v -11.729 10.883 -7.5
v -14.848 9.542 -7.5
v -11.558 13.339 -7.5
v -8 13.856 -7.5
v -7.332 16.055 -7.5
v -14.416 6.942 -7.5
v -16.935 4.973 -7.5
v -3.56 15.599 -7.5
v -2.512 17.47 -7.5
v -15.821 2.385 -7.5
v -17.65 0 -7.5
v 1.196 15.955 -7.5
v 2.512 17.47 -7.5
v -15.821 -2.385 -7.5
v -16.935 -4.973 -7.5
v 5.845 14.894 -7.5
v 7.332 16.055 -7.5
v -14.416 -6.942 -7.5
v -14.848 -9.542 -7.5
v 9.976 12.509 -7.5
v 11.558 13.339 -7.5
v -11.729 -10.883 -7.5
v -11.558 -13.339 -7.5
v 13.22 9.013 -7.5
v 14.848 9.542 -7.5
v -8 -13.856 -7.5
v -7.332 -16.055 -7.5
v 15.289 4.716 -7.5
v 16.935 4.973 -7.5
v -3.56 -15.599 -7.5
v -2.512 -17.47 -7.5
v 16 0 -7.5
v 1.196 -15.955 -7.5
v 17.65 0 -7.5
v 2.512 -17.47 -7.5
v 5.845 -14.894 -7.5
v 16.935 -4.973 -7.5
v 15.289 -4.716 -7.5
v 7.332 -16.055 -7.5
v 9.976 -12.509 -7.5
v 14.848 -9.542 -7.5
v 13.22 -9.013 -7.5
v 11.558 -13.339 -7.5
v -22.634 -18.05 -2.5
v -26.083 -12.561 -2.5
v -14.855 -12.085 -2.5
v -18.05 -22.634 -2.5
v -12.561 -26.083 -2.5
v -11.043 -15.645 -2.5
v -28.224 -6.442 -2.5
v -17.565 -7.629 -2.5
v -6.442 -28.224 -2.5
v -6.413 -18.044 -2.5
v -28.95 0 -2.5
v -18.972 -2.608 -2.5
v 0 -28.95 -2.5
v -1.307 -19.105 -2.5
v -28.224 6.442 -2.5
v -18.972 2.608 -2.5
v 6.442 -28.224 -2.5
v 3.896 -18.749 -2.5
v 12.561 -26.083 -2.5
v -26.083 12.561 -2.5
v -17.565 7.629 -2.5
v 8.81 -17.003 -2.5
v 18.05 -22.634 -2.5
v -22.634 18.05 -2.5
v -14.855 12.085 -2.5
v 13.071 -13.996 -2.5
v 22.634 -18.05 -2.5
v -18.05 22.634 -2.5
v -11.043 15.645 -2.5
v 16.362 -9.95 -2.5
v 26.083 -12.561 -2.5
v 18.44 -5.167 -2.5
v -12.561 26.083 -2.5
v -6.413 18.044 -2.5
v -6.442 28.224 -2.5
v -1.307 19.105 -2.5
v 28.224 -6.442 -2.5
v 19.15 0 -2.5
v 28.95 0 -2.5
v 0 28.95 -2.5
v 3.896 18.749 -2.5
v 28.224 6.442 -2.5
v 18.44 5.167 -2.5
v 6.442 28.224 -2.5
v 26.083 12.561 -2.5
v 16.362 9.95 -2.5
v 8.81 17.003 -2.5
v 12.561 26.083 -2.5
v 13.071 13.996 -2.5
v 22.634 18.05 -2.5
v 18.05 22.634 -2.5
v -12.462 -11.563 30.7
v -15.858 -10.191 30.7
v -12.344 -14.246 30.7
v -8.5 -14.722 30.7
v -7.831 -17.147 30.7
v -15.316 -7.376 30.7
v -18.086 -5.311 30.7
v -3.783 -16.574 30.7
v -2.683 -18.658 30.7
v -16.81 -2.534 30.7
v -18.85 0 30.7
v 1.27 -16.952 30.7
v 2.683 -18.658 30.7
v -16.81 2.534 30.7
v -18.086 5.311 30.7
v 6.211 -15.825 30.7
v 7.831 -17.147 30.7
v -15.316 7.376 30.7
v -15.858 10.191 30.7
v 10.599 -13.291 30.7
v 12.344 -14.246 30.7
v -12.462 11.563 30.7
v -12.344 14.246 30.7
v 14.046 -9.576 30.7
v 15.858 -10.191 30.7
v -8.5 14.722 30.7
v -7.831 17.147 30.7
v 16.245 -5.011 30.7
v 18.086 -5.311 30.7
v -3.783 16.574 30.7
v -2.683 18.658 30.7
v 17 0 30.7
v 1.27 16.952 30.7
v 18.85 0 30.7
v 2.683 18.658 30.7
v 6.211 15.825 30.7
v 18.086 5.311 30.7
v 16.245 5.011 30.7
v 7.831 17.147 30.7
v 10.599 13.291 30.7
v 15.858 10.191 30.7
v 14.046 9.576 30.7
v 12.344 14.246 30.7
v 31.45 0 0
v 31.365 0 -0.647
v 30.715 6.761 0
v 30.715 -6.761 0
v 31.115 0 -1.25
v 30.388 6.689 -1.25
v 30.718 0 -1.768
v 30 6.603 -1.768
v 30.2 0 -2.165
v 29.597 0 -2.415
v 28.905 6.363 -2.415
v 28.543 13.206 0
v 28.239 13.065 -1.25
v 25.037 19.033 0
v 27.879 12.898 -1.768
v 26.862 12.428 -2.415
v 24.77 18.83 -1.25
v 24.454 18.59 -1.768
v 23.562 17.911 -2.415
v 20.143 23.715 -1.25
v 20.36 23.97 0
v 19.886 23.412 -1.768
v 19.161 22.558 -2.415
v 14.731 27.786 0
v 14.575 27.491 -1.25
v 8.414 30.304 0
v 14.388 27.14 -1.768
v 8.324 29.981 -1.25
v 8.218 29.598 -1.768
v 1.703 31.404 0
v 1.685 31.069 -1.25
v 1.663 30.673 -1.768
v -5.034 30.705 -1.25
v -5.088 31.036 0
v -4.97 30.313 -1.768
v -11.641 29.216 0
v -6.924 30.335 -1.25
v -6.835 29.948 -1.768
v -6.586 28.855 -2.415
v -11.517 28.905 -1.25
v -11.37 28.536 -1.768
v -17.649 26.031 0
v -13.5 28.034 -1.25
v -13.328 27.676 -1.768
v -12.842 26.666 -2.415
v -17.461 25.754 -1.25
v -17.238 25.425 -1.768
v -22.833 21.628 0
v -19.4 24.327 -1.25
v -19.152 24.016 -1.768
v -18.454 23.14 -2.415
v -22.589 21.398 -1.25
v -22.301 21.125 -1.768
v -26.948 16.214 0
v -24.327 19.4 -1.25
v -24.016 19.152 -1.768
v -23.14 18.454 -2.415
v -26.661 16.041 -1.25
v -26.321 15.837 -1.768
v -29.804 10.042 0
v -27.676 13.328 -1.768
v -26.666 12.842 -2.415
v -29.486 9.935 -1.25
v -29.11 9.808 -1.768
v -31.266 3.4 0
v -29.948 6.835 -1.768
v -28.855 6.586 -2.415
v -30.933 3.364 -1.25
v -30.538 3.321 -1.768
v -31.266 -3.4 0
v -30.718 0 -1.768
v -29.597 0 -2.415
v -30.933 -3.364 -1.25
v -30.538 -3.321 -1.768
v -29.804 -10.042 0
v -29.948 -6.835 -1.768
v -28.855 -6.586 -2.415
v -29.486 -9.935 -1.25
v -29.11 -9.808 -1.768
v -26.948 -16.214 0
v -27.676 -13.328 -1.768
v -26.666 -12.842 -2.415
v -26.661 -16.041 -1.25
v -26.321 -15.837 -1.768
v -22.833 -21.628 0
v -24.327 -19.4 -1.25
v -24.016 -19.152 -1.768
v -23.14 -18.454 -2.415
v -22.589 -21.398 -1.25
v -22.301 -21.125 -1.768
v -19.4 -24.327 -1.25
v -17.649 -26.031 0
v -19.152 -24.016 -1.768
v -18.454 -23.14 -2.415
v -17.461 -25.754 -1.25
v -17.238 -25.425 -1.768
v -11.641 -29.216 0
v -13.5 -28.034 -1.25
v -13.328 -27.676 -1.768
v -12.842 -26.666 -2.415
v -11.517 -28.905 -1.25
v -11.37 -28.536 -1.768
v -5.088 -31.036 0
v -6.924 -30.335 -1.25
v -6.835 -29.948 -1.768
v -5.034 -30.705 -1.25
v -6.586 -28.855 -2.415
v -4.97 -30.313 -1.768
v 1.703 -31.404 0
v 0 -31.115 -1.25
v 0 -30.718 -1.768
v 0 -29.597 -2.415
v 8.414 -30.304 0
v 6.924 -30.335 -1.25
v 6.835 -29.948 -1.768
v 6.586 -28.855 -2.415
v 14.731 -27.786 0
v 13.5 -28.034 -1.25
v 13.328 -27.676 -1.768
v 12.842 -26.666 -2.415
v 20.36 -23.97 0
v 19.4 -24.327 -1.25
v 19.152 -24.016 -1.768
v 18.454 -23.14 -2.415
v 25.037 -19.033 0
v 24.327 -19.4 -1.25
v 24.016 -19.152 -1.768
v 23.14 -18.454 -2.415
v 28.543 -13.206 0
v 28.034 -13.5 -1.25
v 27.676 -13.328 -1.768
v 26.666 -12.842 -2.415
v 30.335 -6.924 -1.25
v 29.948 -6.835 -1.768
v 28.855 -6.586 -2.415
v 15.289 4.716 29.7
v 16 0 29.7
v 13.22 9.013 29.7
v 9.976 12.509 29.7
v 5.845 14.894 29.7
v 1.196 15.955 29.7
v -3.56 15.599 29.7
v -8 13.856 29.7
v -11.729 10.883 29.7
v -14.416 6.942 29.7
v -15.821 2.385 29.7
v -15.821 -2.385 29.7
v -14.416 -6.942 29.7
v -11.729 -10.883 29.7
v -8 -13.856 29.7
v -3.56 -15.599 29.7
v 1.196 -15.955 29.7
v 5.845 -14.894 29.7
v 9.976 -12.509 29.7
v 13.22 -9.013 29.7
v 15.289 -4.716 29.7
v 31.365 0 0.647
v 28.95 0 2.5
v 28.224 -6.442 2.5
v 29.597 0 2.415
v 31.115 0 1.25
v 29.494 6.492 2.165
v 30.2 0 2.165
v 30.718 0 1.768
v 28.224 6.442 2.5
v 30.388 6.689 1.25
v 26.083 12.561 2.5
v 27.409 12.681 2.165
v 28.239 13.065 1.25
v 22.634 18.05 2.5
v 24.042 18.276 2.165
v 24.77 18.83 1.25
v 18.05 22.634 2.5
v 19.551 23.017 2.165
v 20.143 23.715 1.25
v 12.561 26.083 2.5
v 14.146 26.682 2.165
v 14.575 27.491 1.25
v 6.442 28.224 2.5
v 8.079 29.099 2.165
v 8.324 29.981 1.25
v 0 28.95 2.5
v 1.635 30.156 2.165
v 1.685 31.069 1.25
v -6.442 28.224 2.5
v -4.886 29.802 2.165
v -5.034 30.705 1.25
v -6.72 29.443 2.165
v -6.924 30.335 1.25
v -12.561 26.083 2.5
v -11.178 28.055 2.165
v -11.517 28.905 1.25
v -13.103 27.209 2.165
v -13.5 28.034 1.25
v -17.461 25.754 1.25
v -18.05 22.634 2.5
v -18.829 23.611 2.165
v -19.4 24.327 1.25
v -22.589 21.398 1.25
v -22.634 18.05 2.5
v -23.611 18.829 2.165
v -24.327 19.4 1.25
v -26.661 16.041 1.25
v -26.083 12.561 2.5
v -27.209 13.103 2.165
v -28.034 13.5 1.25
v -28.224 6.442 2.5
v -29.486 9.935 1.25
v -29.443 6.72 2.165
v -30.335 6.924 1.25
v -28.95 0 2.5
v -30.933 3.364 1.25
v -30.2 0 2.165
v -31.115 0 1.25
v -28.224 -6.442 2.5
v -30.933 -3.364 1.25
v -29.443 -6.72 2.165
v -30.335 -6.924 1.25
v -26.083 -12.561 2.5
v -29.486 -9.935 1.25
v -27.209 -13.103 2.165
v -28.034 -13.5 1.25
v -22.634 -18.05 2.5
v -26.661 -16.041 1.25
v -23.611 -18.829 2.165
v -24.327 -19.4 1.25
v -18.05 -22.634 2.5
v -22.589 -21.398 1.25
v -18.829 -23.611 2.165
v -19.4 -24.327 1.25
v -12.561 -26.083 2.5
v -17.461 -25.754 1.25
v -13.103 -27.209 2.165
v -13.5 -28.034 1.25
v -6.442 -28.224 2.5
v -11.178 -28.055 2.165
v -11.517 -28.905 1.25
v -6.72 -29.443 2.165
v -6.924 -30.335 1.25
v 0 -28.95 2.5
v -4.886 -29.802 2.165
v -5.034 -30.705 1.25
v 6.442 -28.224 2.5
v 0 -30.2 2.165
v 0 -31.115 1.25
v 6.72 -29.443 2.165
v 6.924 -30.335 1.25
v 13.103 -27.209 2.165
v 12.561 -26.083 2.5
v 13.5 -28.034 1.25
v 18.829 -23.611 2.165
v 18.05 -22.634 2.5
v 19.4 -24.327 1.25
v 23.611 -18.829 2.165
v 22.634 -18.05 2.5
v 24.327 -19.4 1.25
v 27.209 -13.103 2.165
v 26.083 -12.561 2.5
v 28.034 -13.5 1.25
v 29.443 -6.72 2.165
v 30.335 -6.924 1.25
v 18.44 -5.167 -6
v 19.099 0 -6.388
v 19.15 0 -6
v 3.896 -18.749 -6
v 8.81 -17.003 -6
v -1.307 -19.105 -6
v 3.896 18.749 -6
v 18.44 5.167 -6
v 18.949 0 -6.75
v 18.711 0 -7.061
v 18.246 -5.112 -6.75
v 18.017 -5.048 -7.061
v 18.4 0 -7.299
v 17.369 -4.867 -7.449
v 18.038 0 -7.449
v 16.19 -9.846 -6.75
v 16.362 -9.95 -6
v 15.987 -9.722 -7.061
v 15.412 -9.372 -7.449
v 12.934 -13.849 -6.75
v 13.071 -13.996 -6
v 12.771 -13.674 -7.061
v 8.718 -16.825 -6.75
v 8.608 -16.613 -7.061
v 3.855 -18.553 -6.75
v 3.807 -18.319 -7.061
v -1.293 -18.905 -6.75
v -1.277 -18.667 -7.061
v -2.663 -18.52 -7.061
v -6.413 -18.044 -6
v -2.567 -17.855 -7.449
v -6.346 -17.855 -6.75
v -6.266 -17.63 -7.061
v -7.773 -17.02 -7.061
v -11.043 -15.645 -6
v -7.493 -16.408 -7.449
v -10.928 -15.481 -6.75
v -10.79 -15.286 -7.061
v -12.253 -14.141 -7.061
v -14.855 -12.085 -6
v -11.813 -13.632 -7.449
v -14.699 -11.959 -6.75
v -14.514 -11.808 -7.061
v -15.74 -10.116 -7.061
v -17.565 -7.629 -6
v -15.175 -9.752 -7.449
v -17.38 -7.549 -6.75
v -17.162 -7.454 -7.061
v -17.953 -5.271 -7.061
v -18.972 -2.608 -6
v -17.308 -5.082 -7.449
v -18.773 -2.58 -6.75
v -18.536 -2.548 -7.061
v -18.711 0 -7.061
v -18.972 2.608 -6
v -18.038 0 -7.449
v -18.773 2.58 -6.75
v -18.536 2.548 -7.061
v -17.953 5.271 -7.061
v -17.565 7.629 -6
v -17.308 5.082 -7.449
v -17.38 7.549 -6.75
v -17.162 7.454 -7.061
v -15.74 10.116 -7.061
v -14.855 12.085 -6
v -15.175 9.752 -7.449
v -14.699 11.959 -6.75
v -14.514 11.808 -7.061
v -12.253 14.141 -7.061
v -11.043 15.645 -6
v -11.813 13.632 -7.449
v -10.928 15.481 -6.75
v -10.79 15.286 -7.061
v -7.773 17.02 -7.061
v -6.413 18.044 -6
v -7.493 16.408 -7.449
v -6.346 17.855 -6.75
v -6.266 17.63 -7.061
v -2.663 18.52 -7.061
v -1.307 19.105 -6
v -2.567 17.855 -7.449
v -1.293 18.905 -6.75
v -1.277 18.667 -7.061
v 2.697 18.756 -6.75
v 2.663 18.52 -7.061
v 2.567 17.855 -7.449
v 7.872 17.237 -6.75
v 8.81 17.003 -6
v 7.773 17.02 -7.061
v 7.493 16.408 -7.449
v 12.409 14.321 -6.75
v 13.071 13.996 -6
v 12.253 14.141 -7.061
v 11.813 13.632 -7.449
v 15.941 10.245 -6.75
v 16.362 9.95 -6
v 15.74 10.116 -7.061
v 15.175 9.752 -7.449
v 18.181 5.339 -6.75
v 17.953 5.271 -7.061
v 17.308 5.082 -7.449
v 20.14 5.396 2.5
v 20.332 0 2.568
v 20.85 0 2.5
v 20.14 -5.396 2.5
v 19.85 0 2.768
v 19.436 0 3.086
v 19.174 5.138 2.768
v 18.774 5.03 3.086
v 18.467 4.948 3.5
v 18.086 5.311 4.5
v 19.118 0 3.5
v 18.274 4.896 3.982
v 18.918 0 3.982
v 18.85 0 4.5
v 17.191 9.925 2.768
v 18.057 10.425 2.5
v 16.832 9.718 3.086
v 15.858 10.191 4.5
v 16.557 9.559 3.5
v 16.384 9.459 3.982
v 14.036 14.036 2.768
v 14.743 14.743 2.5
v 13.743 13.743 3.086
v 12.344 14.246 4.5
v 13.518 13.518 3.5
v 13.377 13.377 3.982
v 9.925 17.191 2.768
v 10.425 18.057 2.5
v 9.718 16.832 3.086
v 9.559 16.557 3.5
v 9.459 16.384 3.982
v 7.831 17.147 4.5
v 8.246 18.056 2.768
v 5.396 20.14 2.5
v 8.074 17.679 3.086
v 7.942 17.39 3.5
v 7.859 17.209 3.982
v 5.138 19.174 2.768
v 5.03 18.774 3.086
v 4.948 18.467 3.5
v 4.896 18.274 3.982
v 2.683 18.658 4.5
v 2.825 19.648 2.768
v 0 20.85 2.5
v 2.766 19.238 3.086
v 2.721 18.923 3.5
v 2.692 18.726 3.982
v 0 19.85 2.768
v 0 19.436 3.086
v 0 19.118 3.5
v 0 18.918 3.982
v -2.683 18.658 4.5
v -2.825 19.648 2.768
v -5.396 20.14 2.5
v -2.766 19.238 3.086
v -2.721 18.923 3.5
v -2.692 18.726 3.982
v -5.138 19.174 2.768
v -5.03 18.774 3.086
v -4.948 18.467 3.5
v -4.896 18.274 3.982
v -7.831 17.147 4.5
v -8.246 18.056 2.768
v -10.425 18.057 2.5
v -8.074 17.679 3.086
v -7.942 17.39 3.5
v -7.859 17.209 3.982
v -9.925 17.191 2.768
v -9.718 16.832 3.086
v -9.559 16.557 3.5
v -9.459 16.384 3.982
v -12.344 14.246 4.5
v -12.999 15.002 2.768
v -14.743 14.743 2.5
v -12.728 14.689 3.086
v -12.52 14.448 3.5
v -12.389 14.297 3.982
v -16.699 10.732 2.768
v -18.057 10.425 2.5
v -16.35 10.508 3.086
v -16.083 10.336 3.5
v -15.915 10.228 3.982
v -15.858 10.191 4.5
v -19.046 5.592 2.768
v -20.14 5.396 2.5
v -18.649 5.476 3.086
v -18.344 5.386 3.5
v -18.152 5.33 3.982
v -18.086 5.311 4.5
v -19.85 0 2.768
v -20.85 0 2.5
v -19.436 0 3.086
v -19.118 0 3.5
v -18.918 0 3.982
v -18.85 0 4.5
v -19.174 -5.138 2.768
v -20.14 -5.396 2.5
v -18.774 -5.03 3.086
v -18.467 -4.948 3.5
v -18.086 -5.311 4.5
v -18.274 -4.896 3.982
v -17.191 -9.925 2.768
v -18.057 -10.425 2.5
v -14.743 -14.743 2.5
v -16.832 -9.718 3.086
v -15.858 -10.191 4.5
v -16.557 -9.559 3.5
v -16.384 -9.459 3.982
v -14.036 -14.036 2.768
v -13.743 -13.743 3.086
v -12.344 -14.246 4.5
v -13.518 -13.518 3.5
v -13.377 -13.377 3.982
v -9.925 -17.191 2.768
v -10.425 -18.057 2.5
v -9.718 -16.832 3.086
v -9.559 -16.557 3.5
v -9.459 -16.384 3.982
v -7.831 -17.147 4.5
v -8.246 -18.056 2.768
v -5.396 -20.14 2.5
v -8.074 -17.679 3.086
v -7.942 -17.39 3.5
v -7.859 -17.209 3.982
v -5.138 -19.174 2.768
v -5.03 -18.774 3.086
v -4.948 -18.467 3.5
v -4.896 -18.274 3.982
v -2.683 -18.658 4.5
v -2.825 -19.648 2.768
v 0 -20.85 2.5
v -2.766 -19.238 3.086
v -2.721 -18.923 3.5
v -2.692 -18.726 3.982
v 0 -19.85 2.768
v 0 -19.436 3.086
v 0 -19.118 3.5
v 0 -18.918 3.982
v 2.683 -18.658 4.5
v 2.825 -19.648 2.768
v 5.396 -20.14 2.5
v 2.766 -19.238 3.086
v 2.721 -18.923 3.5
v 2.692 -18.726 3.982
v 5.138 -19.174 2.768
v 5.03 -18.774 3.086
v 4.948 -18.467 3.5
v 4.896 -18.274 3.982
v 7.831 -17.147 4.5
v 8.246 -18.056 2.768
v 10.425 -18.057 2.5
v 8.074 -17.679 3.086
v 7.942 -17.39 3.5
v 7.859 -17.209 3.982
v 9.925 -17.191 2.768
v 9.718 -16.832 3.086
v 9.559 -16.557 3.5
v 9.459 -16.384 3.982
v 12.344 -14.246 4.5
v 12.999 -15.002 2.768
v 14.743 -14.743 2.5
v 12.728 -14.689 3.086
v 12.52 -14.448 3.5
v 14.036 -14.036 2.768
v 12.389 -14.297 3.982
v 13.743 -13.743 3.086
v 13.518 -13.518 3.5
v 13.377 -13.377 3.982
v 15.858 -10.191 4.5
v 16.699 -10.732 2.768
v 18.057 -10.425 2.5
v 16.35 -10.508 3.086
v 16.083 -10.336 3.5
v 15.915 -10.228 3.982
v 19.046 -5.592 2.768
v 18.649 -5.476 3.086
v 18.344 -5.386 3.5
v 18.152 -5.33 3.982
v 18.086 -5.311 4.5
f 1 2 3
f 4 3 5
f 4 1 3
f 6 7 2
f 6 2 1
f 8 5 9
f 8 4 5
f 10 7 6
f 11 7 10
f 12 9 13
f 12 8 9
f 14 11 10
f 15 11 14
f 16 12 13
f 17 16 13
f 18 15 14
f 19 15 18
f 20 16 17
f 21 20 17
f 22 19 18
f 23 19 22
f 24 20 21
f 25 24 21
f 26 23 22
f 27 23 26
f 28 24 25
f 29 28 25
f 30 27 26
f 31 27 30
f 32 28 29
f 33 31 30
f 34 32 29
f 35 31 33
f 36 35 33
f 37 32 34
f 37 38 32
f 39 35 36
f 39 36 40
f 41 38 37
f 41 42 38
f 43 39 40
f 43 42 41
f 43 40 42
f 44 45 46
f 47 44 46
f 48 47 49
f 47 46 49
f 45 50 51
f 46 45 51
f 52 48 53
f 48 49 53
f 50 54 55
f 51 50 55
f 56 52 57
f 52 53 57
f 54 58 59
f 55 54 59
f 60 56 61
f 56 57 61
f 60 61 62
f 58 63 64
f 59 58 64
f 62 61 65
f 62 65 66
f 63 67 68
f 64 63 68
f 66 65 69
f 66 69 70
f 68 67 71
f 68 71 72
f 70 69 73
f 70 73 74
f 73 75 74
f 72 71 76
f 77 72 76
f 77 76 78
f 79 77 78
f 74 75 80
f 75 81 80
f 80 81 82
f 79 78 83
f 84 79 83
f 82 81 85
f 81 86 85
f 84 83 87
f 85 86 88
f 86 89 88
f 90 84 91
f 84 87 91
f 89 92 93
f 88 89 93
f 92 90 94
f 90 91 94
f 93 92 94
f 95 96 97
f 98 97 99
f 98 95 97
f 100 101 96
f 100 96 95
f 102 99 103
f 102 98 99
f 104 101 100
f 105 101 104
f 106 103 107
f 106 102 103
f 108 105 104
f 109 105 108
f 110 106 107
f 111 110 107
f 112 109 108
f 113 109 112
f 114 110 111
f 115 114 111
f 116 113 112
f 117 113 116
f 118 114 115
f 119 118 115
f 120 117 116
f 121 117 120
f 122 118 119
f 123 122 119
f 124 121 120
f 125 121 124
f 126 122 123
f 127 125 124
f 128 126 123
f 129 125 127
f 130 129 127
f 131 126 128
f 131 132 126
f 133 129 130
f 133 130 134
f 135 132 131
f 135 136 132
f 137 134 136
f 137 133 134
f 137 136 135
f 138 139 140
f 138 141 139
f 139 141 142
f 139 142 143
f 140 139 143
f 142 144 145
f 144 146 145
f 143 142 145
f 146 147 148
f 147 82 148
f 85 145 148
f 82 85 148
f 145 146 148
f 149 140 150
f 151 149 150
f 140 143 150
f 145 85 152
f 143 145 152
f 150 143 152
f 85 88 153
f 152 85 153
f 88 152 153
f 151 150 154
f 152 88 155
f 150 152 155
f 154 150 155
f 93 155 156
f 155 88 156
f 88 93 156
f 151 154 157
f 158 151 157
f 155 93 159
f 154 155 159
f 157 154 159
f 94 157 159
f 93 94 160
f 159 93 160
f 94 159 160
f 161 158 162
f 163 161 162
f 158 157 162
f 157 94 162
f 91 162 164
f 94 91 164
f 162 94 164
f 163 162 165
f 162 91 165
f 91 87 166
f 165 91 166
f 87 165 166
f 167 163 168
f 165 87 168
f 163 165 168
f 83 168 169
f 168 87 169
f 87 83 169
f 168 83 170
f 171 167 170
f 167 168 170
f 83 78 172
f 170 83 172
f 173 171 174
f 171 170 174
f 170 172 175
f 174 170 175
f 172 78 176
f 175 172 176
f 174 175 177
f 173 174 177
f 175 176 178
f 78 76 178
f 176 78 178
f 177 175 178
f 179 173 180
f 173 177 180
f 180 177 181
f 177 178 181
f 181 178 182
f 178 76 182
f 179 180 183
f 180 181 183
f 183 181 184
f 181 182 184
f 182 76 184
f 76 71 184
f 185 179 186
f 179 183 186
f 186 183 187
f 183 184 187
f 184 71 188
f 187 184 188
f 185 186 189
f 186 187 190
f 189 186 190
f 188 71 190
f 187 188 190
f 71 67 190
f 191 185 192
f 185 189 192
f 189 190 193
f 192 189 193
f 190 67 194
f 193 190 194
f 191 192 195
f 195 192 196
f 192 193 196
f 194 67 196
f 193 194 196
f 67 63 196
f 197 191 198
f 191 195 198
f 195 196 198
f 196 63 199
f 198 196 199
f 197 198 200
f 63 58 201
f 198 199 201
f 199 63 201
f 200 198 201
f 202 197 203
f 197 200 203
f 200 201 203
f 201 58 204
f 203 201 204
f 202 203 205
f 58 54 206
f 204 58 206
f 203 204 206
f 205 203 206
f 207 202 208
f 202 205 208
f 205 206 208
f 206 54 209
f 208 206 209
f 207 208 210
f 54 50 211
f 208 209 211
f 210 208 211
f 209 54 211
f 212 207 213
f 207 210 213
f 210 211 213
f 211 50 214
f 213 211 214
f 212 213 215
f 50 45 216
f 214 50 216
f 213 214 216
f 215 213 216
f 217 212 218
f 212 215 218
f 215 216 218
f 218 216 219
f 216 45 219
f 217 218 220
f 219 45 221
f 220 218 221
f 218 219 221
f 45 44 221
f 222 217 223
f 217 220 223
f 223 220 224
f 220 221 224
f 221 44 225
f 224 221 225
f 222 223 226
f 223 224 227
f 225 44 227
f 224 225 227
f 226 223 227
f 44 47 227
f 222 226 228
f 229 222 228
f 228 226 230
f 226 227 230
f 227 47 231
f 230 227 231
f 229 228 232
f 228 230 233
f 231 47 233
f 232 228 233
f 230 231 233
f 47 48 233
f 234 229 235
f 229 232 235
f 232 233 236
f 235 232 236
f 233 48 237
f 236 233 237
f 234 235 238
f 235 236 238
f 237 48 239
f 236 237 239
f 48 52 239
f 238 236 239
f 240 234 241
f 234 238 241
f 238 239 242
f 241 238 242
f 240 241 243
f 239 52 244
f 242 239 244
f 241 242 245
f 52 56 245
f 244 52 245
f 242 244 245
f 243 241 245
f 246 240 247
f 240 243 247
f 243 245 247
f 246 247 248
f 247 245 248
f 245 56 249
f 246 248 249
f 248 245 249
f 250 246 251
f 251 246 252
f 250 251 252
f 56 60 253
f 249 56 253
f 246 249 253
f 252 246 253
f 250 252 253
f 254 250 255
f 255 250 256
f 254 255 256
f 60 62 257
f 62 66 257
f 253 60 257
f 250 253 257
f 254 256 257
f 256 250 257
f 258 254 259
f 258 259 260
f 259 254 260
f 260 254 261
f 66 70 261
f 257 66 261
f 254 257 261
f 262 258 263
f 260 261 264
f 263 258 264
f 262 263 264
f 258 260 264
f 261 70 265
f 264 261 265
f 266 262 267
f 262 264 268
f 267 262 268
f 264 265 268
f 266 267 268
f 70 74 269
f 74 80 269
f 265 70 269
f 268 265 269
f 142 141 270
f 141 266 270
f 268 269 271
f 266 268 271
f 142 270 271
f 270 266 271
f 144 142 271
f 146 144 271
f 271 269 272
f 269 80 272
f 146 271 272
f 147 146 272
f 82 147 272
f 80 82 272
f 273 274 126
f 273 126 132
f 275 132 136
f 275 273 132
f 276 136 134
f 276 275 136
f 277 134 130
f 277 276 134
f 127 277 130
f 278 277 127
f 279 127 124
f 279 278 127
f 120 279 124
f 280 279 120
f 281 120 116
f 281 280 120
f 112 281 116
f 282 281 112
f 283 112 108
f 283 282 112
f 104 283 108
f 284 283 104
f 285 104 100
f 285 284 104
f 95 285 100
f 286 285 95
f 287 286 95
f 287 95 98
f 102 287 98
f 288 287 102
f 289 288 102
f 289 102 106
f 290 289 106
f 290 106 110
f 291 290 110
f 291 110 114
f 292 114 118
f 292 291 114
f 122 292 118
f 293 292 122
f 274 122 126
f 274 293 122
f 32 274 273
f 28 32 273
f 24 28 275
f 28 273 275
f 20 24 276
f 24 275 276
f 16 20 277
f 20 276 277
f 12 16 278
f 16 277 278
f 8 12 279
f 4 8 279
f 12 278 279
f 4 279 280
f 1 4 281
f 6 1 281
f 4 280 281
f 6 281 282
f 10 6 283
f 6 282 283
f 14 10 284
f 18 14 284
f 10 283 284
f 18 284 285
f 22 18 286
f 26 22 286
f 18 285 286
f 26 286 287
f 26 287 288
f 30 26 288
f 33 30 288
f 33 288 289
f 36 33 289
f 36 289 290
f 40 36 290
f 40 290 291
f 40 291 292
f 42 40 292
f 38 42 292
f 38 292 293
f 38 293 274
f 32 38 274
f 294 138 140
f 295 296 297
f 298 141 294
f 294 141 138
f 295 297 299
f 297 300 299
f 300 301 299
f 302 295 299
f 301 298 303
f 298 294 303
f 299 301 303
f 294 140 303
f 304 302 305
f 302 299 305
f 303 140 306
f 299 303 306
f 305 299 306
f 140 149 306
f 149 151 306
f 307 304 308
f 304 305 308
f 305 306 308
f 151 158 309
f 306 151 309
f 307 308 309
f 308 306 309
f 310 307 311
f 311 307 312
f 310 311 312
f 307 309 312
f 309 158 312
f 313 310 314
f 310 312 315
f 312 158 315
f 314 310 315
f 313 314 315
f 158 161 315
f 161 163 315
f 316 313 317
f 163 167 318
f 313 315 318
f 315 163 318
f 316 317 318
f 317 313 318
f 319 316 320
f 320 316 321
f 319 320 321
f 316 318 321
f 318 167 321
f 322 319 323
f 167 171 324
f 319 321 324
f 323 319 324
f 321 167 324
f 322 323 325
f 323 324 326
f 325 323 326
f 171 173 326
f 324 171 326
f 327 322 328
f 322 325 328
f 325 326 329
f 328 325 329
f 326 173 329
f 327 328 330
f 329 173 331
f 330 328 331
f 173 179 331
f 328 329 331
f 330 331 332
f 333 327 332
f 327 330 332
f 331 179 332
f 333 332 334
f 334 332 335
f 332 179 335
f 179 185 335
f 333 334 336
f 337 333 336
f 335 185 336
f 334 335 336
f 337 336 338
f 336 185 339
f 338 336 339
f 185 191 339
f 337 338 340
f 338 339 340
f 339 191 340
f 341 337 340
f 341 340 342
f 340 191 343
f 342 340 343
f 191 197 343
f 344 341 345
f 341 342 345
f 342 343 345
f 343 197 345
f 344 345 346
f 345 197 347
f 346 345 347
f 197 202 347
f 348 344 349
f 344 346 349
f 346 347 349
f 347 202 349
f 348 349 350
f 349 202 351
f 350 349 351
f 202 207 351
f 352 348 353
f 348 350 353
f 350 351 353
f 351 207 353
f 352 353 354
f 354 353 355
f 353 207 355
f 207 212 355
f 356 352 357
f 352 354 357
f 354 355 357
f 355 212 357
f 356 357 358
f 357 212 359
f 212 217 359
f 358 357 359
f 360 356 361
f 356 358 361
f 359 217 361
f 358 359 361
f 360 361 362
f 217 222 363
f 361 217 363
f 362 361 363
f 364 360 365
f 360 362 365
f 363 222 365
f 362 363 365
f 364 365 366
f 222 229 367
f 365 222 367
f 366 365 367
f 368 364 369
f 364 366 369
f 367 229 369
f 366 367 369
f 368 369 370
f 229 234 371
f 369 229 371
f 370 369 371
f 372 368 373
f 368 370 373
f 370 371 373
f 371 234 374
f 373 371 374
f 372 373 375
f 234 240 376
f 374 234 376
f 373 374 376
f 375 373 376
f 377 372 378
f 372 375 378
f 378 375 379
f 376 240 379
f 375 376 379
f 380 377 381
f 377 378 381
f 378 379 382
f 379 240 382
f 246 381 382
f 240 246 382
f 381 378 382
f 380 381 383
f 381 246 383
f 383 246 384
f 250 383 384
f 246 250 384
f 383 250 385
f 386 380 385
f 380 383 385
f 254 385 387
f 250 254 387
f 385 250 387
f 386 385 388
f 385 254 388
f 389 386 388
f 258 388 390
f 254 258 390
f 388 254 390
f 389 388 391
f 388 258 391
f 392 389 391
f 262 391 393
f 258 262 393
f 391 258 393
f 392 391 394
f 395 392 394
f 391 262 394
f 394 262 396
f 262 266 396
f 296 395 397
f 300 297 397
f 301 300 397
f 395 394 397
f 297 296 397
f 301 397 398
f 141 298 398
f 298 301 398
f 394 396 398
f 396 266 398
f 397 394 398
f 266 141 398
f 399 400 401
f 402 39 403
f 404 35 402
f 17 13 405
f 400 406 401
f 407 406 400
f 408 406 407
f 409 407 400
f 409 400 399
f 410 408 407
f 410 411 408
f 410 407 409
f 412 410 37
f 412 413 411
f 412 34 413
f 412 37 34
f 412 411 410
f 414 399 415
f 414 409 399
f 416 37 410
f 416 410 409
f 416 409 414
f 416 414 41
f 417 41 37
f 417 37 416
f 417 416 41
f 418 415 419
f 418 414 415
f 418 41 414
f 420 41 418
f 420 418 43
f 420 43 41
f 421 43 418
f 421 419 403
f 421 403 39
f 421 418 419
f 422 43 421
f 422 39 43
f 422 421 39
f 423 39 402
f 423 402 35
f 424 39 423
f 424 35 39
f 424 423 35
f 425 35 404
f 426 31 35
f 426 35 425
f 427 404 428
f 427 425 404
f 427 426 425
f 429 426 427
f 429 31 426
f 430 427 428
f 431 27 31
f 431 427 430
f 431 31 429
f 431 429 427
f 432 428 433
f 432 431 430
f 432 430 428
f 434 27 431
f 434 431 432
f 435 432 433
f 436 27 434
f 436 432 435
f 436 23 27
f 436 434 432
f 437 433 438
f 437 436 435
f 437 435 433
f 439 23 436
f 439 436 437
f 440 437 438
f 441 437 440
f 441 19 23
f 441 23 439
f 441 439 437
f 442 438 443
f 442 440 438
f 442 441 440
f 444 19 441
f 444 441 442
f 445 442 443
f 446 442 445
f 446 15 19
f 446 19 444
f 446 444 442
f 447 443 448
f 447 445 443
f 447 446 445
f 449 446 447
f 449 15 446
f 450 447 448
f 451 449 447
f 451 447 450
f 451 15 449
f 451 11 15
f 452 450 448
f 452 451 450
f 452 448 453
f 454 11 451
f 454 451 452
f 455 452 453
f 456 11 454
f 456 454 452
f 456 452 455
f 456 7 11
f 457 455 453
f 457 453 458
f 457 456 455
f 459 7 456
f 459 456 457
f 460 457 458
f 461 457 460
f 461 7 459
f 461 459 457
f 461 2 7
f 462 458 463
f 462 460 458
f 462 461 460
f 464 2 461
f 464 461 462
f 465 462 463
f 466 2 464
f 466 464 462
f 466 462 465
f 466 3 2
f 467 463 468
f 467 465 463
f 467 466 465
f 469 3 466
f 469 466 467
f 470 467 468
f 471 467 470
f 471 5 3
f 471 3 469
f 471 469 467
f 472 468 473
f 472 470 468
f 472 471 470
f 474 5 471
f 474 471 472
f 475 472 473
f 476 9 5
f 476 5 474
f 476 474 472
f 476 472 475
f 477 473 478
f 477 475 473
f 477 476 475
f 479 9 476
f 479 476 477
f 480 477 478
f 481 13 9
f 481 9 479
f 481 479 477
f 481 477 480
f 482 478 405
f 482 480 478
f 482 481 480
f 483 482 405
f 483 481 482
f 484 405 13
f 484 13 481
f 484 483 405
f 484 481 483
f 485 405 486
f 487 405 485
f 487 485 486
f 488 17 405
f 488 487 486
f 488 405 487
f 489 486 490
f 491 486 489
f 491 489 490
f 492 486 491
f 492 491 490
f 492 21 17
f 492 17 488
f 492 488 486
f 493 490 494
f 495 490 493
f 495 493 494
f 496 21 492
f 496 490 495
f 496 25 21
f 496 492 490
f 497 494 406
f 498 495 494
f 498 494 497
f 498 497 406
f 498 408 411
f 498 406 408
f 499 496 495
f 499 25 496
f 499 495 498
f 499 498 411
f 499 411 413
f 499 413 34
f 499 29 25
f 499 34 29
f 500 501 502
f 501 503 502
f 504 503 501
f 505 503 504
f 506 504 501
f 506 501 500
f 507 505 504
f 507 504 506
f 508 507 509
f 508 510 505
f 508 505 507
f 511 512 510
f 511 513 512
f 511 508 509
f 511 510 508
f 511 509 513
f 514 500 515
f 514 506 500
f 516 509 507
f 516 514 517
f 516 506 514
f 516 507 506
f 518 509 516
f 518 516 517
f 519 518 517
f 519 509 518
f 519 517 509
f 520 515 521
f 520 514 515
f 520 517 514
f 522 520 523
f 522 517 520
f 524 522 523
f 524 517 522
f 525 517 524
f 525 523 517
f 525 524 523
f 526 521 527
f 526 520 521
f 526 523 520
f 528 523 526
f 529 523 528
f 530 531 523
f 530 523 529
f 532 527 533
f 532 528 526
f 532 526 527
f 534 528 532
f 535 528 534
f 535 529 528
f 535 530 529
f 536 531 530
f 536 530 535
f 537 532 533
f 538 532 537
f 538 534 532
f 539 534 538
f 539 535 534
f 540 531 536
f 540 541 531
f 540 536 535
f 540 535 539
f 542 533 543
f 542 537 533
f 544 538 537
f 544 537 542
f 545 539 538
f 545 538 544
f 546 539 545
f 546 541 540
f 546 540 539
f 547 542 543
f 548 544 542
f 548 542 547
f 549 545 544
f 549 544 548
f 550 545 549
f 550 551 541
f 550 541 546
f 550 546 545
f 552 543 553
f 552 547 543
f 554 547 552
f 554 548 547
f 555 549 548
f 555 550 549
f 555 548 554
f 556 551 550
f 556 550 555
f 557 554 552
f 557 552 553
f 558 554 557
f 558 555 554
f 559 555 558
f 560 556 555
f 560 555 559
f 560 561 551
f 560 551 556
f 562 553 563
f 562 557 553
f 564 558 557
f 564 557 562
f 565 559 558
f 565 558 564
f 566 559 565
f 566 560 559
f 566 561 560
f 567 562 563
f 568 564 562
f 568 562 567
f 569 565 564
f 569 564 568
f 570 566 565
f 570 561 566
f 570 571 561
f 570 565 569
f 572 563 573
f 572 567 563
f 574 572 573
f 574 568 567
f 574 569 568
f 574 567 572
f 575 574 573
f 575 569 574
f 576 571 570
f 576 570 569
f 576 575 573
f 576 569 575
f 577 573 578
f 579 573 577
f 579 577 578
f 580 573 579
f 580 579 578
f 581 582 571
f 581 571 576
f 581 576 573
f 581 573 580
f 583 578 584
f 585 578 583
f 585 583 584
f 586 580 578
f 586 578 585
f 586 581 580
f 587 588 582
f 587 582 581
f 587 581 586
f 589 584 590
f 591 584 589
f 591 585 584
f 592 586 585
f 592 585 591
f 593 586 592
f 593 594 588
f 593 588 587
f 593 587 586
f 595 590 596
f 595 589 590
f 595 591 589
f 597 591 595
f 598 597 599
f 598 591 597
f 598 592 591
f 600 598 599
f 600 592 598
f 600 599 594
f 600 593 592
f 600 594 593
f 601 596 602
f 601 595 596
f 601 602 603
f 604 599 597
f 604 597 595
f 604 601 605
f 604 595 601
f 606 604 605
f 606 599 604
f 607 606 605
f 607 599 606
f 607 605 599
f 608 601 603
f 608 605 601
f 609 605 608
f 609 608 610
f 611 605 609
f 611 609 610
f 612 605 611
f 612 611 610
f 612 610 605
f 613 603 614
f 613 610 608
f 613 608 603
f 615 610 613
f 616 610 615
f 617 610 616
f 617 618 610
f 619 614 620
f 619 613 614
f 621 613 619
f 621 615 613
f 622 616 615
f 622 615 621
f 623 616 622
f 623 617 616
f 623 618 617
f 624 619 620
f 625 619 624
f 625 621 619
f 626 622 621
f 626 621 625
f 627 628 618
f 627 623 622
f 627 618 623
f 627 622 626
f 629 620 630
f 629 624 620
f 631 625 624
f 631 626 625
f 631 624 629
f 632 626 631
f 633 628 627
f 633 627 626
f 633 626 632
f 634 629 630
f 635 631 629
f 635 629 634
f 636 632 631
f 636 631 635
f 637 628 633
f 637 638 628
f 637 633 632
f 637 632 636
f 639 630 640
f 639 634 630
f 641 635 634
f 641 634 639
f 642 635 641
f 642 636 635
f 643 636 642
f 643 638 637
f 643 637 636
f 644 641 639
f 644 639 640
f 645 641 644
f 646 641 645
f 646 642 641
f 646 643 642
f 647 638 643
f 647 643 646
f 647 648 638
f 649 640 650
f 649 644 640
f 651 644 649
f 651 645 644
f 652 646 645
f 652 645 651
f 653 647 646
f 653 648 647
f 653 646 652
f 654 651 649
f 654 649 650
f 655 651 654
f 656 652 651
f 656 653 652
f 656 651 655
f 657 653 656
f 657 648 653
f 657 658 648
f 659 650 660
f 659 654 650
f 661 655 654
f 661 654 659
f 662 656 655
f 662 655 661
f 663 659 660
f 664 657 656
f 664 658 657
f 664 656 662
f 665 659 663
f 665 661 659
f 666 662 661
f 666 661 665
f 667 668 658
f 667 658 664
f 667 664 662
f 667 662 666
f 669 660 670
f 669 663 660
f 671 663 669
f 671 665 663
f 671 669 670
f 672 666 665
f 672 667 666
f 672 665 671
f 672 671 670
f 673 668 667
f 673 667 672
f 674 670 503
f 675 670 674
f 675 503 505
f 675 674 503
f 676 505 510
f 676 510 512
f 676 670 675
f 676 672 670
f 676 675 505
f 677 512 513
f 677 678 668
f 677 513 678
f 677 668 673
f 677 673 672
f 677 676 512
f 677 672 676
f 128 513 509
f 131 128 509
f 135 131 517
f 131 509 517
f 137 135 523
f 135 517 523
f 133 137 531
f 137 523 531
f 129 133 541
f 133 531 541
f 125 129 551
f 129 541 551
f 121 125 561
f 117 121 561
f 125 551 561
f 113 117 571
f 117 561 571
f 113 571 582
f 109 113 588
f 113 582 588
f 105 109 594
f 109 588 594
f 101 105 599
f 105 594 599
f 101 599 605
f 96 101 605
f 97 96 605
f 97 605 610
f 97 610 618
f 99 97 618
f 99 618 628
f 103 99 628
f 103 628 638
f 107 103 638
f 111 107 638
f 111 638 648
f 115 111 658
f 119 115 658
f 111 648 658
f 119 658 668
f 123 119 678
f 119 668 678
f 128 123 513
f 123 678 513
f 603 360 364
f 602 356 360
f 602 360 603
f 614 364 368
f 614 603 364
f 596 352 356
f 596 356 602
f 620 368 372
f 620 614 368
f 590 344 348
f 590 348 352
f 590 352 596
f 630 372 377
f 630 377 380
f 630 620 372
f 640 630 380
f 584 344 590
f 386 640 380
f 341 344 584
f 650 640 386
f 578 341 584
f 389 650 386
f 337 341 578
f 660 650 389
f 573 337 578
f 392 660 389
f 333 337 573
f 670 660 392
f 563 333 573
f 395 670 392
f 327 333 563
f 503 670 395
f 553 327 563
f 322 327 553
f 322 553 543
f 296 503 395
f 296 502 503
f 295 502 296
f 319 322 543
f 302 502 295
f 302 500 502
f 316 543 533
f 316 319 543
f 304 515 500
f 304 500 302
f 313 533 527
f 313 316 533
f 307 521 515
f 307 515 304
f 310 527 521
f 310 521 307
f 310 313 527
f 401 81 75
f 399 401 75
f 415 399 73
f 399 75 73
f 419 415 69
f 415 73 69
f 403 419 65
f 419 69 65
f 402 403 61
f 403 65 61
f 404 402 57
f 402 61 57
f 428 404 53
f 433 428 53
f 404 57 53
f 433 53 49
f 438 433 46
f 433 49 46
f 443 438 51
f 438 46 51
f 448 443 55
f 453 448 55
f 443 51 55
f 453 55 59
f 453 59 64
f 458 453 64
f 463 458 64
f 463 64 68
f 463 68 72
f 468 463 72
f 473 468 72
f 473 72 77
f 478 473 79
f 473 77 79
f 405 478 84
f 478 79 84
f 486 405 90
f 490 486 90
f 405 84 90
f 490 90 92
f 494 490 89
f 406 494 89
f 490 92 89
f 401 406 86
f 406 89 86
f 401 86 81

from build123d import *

# Parameters (mm, degrees)
BOSS_EXTRUDE1_START     = -2.5
BOSS_EXTRUDE1_OUTLINE_R = 31.45
BOSS_EXTRUDE1_DEPTH     = 5
SKETCH2_R               = 18.85
BOSS_EXTRUDE2_DEPTH     = 28.2
SKETCH3_R               = 19.15
BOSS_EXTRUDE3_DEPTH     = 5
SKETCH5_R               = 16
CUT_EXTRUDE2_DEPTH      = 59.629727954
FILLET7_R               = 2
CHAMFER2_SIZE           = 1
FILLET8_R               = 2.5
FILLET9_R               = 1.5


# Read off the part's stored shape, not the designer's step: Boss-Extrude1
with BuildPart() as part:
    # Boss-Extrude1 outline → Boss-Extrude1 (new body)
    with BuildSketch(Plane.XY.offset(BOSS_EXTRUDE1_START)):
        Circle(BOSS_EXTRUDE1_OUTLINE_R)
    extrude(amount=BOSS_EXTRUDE1_DEPTH)

    # Sketch2 → Boss-Extrude2 (add)
    with BuildSketch(Plane.XY.offset(2.5)):
        Circle(SKETCH2_R)
    extrude(amount=BOSS_EXTRUDE2_DEPTH)

    # Sketch3 → Boss-Extrude3 (add)
    with BuildSketch(Plane(origin=(0, 0, -2.5), x_dir=(-1, 0, 0), z_dir=(0, 0, -1))):
        with Locations(Location((0, 0, 0), (0, 0, 180))):
            Circle(SKETCH3_R)
    extrude(amount=BOSS_EXTRUDE3_DEPTH)

    # Sketch5 → Cut-Extrude2 (cut, through all)
    with BuildSketch(Plane.XY.offset(30.7)):
        Circle(SKETCH5_R)
    extrude(amount=-CUT_EXTRUDE2_DEPTH, mode=Mode.SUBTRACT)

    # Fillet7
    fillet7_edges = [part.edges().sort_by_distance(p)[0] for p in [
        (-18.85, 0, 2.5),
    ]]
    fillet(fillet7_edges, radius=FILLET7_R)

    # Chamfer2
    chamfer2_edges = [part.edges().sort_by_distance(p)[0] for p in [
        (-16, 0, 30.7),
    ]]
    chamfer(chamfer2_edges, length=CHAMFER2_SIZE)

    # Fillet8
    fillet8_edges = [part.edges().sort_by_distance(p)[0] for p in [
        (-31.45, 0, -2.5),
        (-31.45, 0, 2.5),
    ]]
    fillet(fillet8_edges, radius=FILLET8_R - 0.0001)  # a hair under: the kernel refuses the full size

    # Fillet9
    fillet9_edges = [part.edges().sort_by_distance(p)[0] for p in [
        (-19.15, 0, -7.5),
    ]]
    fillet(fillet9_edges, radius=FILLET9_R)


solid = part.part
